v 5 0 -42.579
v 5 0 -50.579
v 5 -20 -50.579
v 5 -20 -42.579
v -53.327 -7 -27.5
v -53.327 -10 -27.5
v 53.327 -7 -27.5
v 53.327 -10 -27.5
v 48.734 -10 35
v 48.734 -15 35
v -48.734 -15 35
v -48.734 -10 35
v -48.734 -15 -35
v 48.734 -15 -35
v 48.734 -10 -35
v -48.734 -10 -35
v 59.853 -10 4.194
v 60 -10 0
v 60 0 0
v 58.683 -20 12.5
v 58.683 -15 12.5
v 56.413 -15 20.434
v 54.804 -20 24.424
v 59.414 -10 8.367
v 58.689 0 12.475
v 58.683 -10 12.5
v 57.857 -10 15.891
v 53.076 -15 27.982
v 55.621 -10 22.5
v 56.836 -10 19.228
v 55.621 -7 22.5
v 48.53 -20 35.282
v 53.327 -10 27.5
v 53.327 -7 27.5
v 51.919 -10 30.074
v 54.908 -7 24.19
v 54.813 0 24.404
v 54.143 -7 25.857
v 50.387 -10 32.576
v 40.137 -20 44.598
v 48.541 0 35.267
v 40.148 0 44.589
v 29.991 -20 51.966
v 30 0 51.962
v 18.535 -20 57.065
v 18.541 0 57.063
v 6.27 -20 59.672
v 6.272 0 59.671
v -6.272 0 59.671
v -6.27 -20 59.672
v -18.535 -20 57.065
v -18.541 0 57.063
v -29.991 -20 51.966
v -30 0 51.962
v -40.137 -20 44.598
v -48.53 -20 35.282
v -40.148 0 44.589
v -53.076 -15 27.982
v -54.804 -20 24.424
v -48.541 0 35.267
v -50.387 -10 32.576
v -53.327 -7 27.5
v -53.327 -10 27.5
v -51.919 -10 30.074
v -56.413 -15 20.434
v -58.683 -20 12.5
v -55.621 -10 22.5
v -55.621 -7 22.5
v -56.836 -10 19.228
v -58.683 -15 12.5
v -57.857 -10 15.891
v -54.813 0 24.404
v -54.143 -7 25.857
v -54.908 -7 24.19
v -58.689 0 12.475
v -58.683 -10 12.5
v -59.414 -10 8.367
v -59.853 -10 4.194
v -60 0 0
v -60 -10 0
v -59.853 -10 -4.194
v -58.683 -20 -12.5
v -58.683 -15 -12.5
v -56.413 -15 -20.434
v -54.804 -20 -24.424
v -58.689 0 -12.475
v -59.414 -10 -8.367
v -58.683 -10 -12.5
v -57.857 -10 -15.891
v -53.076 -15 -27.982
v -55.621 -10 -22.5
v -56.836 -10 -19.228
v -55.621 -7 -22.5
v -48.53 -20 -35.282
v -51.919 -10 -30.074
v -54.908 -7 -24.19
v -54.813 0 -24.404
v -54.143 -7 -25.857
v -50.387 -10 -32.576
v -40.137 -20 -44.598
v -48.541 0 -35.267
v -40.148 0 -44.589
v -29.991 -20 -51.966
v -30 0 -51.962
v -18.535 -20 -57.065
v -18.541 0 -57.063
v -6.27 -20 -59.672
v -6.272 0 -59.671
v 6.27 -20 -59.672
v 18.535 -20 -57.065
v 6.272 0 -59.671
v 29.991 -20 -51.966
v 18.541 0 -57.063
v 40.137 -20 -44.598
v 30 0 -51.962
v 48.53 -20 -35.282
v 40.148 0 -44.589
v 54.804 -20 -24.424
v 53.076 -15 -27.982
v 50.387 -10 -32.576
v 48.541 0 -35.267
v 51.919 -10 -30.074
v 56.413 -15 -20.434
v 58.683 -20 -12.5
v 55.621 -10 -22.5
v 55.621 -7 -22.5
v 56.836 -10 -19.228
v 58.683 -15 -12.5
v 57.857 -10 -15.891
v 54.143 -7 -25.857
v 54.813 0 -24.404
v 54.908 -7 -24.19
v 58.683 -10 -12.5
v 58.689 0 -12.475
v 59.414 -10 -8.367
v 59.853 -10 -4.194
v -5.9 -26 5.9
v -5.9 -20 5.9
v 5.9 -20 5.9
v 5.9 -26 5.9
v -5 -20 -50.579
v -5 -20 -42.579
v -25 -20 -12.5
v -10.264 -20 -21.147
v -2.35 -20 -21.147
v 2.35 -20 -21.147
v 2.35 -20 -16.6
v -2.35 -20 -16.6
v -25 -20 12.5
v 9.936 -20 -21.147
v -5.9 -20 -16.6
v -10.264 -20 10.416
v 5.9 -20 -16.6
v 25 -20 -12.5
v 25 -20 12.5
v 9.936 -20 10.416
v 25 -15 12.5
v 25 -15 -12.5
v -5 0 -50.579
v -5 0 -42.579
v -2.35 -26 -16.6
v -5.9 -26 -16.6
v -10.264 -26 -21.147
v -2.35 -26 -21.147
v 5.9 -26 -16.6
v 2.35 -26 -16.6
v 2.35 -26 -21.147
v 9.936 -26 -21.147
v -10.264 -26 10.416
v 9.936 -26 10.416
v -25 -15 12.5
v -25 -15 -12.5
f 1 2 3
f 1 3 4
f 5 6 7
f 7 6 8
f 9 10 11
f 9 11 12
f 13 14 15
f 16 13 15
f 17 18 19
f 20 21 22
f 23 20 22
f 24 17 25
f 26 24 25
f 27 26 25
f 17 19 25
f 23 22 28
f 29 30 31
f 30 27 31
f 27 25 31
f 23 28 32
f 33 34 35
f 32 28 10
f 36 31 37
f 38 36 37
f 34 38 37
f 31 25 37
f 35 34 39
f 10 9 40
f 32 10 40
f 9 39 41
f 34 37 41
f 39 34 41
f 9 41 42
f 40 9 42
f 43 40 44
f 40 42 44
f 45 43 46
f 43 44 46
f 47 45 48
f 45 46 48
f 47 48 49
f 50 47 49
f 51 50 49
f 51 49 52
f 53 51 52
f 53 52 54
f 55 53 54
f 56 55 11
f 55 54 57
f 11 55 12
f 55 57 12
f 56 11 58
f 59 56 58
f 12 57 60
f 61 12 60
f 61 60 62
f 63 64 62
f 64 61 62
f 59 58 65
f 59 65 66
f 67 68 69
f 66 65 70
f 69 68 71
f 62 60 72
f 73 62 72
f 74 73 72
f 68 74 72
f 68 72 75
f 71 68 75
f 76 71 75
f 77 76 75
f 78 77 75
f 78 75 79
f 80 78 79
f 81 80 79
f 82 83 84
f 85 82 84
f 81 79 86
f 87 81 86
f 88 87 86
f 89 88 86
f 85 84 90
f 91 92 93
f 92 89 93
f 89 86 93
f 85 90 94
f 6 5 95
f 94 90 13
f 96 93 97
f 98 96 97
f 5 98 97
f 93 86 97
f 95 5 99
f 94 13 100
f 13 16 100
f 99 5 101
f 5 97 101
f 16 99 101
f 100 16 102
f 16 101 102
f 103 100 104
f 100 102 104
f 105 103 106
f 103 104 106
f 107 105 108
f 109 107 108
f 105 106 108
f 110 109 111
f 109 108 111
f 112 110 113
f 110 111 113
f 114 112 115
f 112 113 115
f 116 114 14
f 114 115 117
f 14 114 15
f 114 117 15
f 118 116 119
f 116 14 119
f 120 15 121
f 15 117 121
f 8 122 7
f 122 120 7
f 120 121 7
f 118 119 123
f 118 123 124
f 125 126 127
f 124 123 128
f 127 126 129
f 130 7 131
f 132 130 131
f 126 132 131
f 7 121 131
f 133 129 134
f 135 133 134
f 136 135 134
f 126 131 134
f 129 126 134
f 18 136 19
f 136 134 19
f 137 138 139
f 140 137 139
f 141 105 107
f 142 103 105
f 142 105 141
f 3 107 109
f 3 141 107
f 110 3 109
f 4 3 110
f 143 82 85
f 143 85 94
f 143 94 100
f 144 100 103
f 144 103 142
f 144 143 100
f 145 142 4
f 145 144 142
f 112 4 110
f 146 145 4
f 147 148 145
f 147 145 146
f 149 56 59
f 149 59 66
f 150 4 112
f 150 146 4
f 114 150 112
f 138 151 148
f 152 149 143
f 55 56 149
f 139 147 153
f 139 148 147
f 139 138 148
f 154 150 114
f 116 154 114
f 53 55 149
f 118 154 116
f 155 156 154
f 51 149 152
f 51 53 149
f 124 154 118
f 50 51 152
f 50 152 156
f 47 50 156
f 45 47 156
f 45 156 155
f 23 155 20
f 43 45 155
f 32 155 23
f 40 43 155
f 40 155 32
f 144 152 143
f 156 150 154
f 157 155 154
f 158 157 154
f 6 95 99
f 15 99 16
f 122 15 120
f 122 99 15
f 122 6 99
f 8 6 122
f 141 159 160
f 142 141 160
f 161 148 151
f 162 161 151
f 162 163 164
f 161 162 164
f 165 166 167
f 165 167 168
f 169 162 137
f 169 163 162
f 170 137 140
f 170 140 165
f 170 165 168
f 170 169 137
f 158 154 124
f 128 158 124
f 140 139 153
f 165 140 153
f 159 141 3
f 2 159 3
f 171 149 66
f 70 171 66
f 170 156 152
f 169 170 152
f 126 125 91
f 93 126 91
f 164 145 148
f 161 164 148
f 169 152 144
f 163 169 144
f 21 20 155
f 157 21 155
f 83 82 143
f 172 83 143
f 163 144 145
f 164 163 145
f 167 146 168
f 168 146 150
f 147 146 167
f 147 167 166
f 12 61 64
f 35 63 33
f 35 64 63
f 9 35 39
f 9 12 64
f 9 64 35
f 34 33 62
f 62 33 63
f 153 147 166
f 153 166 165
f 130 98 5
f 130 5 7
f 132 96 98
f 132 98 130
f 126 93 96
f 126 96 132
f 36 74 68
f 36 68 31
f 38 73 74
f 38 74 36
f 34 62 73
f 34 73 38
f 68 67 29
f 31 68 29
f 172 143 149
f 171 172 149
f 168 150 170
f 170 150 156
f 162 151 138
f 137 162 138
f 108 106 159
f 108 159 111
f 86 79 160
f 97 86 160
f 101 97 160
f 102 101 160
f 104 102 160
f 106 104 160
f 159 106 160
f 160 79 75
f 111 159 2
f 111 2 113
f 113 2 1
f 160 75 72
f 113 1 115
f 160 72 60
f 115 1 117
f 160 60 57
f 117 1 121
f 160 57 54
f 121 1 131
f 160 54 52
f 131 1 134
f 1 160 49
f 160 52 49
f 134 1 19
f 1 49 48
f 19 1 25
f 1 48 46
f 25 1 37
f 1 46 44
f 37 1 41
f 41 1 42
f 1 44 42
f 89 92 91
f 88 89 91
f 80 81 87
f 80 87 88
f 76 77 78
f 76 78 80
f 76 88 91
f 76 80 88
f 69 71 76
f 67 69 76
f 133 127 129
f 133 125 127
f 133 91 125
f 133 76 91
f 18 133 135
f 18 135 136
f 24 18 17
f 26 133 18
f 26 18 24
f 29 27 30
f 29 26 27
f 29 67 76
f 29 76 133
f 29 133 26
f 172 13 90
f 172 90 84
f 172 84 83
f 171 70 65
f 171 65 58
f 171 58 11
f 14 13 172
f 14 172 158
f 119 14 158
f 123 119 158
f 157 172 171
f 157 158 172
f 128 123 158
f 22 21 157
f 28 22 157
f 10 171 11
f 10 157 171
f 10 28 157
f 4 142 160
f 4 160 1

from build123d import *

# Parameters (mm, degrees)
F0_R      = 60
F1_DEPTH  = 20
F3_DEPTH  = 10
F4_W      = 5
F4_H      = 70
F5_DEPTH  = 60
F7_DEPTH  = 3
F8_W      = 3.5498722099
F8_H      = 4.546627143
F9_DEPTH  = 6
F10_W     = 10
F10_H     = 8
F11_DEPTH = 20.001


with BuildPart() as f1:
    # F0 (on Front) → F1 (new body)
    with BuildSketch(Plane.XZ):
        Circle(F0_R)
    extrude(amount=F1_DEPTH)

    # F2 (on face) → F3 (cut)
    with BuildSketch(Plane.XZ.offset(20)):
        with BuildLine():
            Line((-25, -12.5), (-25, 12.5))
            Line((-25, 12.5), (-58.6834729715, 12.5))
            ThreePointArc((-58.6834729715, 12.5), (-59.6699605258, 6.2845692656), (-60, 0))
            ThreePointArc((-60, 0), (-59.6699605258, -6.2845692656), (-58.6834729715, -12.5))
            Line((-58.6834729715, -12.5), (-25, -12.5))
        make_face()
        with BuildLine():
            Line((58.6834729715, 12.5), (25, 12.5))
            Line((25, 12.5), (25, -12.5))
            Line((25, -12.5), (58.6834729715, -12.5))
            ThreePointArc((58.6834729715, -12.5), (59.6699605258, -6.2845692656), (60, 0))
            ThreePointArc((60, 0), (59.6699605258, 6.2845692656), (58.6834729715, 12.5))
        make_face()
    extrude(amount=-F3_DEPTH, mode=Mode.SUBTRACT)

    # F4 (on Right) → F5 (cut, symmetric)
    with BuildSketch(Plane.YZ):
        with Locations((-12.5, 0)):
            Rectangle(F4_W, F4_H)
    extrude(amount=F5_DEPTH, both=True, mode=Mode.SUBTRACT)

    # F6 (on face) → F7 (cut)
    with BuildSketch(Plane.XZ.offset(10)):
        with BuildLine():
            Line((30, -22.5), (30, -25))
            Line((30, -25), (-30, -25))
            Line((-30, -25), (-30, -22.5))
            Line((-30, -22.5), (-55.6214886532, -22.5))
            ThreePointArc((-55.6214886532, -22.5), (-54.531492065, -25.0263136152), (-53.3268225193, -27.5))
            Line((-53.3268225193, -27.5), (0, -27.5))
            Line((0, -27.5), (53.3268225193, -27.5))
            ThreePointArc((53.3268225193, -27.5), (54.531492065, -25.0263136152), (55.6214886532, -22.5))
            Line((55.6214886532, -22.5), (30, -22.5))
        make_face()
        with BuildLine():
            Line((30, 25), (30, 22.5))
            Line((30, 22.5), (55.6214886532, 22.5))
            ThreePointArc((55.6214886532, 22.5), (54.531492065, 25.0263136152), (53.3268225193, 27.5))
            Line((53.3268225193, 27.5), (0, 27.5))
            Line((0, 27.5), (-53.3268225193, 27.5))
            ThreePointArc((-53.3268225193, 27.5), (-54.531492065, 25.0263136152), (-55.6214886532, 22.5))
            Line((-55.6214886532, 22.5), (-30, 22.5))
            Line((-30, 22.5), (-30, 25))
            Line((-30, 25), (30, 25))
        make_face()
        Polygon((0, 22.5), (30, 22.5), (30, 25), (-30, 25), (-30, 22.5), align=None)
        Polygon((-30, -25), (30, -25), (30, -22.5), (0, -22.5), (-30, -22.5), align=None)
    extrude(amount=-F7_DEPTH, mode=Mode.SUBTRACT)

    # F8 (on face) → F9 (join)
    with BuildSketch(Plane.XZ.offset(20)):
        Polygon((-5.9, -16.6), (-5.9, 5.9), (-10.2642504498, 5.9), (-10.2642504498, -21.146627143), (-2.3501277901, -21.146627143), (-2.3501277901, -16.6), align=None)
        Polygon((-10.2642504498, 5.9), (-5.9, 5.9), (5.9, 5.9), (5.9, -16.6), (5.9, -21.146627143), (9.9355150014, -21.146627143), (9.9355150014, 10.4155028239), (-10.2642504498, 10.4155028239), align=None)
        with Locations((4.1250638951, -18.8733135715)):
            Rectangle(F8_W, F8_H)
    extrude(amount=F9_DEPTH)

    # F10 (on face) → F11 (cut, through all)
    with BuildSketch(Plane.XZ.offset(20)):
        with Locations((0, -46.5785360177)):
            Rectangle(F10_W, F10_H)
    extrude(amount=-F11_DEPTH, mode=Mode.SUBTRACT)


solid = f1.part
